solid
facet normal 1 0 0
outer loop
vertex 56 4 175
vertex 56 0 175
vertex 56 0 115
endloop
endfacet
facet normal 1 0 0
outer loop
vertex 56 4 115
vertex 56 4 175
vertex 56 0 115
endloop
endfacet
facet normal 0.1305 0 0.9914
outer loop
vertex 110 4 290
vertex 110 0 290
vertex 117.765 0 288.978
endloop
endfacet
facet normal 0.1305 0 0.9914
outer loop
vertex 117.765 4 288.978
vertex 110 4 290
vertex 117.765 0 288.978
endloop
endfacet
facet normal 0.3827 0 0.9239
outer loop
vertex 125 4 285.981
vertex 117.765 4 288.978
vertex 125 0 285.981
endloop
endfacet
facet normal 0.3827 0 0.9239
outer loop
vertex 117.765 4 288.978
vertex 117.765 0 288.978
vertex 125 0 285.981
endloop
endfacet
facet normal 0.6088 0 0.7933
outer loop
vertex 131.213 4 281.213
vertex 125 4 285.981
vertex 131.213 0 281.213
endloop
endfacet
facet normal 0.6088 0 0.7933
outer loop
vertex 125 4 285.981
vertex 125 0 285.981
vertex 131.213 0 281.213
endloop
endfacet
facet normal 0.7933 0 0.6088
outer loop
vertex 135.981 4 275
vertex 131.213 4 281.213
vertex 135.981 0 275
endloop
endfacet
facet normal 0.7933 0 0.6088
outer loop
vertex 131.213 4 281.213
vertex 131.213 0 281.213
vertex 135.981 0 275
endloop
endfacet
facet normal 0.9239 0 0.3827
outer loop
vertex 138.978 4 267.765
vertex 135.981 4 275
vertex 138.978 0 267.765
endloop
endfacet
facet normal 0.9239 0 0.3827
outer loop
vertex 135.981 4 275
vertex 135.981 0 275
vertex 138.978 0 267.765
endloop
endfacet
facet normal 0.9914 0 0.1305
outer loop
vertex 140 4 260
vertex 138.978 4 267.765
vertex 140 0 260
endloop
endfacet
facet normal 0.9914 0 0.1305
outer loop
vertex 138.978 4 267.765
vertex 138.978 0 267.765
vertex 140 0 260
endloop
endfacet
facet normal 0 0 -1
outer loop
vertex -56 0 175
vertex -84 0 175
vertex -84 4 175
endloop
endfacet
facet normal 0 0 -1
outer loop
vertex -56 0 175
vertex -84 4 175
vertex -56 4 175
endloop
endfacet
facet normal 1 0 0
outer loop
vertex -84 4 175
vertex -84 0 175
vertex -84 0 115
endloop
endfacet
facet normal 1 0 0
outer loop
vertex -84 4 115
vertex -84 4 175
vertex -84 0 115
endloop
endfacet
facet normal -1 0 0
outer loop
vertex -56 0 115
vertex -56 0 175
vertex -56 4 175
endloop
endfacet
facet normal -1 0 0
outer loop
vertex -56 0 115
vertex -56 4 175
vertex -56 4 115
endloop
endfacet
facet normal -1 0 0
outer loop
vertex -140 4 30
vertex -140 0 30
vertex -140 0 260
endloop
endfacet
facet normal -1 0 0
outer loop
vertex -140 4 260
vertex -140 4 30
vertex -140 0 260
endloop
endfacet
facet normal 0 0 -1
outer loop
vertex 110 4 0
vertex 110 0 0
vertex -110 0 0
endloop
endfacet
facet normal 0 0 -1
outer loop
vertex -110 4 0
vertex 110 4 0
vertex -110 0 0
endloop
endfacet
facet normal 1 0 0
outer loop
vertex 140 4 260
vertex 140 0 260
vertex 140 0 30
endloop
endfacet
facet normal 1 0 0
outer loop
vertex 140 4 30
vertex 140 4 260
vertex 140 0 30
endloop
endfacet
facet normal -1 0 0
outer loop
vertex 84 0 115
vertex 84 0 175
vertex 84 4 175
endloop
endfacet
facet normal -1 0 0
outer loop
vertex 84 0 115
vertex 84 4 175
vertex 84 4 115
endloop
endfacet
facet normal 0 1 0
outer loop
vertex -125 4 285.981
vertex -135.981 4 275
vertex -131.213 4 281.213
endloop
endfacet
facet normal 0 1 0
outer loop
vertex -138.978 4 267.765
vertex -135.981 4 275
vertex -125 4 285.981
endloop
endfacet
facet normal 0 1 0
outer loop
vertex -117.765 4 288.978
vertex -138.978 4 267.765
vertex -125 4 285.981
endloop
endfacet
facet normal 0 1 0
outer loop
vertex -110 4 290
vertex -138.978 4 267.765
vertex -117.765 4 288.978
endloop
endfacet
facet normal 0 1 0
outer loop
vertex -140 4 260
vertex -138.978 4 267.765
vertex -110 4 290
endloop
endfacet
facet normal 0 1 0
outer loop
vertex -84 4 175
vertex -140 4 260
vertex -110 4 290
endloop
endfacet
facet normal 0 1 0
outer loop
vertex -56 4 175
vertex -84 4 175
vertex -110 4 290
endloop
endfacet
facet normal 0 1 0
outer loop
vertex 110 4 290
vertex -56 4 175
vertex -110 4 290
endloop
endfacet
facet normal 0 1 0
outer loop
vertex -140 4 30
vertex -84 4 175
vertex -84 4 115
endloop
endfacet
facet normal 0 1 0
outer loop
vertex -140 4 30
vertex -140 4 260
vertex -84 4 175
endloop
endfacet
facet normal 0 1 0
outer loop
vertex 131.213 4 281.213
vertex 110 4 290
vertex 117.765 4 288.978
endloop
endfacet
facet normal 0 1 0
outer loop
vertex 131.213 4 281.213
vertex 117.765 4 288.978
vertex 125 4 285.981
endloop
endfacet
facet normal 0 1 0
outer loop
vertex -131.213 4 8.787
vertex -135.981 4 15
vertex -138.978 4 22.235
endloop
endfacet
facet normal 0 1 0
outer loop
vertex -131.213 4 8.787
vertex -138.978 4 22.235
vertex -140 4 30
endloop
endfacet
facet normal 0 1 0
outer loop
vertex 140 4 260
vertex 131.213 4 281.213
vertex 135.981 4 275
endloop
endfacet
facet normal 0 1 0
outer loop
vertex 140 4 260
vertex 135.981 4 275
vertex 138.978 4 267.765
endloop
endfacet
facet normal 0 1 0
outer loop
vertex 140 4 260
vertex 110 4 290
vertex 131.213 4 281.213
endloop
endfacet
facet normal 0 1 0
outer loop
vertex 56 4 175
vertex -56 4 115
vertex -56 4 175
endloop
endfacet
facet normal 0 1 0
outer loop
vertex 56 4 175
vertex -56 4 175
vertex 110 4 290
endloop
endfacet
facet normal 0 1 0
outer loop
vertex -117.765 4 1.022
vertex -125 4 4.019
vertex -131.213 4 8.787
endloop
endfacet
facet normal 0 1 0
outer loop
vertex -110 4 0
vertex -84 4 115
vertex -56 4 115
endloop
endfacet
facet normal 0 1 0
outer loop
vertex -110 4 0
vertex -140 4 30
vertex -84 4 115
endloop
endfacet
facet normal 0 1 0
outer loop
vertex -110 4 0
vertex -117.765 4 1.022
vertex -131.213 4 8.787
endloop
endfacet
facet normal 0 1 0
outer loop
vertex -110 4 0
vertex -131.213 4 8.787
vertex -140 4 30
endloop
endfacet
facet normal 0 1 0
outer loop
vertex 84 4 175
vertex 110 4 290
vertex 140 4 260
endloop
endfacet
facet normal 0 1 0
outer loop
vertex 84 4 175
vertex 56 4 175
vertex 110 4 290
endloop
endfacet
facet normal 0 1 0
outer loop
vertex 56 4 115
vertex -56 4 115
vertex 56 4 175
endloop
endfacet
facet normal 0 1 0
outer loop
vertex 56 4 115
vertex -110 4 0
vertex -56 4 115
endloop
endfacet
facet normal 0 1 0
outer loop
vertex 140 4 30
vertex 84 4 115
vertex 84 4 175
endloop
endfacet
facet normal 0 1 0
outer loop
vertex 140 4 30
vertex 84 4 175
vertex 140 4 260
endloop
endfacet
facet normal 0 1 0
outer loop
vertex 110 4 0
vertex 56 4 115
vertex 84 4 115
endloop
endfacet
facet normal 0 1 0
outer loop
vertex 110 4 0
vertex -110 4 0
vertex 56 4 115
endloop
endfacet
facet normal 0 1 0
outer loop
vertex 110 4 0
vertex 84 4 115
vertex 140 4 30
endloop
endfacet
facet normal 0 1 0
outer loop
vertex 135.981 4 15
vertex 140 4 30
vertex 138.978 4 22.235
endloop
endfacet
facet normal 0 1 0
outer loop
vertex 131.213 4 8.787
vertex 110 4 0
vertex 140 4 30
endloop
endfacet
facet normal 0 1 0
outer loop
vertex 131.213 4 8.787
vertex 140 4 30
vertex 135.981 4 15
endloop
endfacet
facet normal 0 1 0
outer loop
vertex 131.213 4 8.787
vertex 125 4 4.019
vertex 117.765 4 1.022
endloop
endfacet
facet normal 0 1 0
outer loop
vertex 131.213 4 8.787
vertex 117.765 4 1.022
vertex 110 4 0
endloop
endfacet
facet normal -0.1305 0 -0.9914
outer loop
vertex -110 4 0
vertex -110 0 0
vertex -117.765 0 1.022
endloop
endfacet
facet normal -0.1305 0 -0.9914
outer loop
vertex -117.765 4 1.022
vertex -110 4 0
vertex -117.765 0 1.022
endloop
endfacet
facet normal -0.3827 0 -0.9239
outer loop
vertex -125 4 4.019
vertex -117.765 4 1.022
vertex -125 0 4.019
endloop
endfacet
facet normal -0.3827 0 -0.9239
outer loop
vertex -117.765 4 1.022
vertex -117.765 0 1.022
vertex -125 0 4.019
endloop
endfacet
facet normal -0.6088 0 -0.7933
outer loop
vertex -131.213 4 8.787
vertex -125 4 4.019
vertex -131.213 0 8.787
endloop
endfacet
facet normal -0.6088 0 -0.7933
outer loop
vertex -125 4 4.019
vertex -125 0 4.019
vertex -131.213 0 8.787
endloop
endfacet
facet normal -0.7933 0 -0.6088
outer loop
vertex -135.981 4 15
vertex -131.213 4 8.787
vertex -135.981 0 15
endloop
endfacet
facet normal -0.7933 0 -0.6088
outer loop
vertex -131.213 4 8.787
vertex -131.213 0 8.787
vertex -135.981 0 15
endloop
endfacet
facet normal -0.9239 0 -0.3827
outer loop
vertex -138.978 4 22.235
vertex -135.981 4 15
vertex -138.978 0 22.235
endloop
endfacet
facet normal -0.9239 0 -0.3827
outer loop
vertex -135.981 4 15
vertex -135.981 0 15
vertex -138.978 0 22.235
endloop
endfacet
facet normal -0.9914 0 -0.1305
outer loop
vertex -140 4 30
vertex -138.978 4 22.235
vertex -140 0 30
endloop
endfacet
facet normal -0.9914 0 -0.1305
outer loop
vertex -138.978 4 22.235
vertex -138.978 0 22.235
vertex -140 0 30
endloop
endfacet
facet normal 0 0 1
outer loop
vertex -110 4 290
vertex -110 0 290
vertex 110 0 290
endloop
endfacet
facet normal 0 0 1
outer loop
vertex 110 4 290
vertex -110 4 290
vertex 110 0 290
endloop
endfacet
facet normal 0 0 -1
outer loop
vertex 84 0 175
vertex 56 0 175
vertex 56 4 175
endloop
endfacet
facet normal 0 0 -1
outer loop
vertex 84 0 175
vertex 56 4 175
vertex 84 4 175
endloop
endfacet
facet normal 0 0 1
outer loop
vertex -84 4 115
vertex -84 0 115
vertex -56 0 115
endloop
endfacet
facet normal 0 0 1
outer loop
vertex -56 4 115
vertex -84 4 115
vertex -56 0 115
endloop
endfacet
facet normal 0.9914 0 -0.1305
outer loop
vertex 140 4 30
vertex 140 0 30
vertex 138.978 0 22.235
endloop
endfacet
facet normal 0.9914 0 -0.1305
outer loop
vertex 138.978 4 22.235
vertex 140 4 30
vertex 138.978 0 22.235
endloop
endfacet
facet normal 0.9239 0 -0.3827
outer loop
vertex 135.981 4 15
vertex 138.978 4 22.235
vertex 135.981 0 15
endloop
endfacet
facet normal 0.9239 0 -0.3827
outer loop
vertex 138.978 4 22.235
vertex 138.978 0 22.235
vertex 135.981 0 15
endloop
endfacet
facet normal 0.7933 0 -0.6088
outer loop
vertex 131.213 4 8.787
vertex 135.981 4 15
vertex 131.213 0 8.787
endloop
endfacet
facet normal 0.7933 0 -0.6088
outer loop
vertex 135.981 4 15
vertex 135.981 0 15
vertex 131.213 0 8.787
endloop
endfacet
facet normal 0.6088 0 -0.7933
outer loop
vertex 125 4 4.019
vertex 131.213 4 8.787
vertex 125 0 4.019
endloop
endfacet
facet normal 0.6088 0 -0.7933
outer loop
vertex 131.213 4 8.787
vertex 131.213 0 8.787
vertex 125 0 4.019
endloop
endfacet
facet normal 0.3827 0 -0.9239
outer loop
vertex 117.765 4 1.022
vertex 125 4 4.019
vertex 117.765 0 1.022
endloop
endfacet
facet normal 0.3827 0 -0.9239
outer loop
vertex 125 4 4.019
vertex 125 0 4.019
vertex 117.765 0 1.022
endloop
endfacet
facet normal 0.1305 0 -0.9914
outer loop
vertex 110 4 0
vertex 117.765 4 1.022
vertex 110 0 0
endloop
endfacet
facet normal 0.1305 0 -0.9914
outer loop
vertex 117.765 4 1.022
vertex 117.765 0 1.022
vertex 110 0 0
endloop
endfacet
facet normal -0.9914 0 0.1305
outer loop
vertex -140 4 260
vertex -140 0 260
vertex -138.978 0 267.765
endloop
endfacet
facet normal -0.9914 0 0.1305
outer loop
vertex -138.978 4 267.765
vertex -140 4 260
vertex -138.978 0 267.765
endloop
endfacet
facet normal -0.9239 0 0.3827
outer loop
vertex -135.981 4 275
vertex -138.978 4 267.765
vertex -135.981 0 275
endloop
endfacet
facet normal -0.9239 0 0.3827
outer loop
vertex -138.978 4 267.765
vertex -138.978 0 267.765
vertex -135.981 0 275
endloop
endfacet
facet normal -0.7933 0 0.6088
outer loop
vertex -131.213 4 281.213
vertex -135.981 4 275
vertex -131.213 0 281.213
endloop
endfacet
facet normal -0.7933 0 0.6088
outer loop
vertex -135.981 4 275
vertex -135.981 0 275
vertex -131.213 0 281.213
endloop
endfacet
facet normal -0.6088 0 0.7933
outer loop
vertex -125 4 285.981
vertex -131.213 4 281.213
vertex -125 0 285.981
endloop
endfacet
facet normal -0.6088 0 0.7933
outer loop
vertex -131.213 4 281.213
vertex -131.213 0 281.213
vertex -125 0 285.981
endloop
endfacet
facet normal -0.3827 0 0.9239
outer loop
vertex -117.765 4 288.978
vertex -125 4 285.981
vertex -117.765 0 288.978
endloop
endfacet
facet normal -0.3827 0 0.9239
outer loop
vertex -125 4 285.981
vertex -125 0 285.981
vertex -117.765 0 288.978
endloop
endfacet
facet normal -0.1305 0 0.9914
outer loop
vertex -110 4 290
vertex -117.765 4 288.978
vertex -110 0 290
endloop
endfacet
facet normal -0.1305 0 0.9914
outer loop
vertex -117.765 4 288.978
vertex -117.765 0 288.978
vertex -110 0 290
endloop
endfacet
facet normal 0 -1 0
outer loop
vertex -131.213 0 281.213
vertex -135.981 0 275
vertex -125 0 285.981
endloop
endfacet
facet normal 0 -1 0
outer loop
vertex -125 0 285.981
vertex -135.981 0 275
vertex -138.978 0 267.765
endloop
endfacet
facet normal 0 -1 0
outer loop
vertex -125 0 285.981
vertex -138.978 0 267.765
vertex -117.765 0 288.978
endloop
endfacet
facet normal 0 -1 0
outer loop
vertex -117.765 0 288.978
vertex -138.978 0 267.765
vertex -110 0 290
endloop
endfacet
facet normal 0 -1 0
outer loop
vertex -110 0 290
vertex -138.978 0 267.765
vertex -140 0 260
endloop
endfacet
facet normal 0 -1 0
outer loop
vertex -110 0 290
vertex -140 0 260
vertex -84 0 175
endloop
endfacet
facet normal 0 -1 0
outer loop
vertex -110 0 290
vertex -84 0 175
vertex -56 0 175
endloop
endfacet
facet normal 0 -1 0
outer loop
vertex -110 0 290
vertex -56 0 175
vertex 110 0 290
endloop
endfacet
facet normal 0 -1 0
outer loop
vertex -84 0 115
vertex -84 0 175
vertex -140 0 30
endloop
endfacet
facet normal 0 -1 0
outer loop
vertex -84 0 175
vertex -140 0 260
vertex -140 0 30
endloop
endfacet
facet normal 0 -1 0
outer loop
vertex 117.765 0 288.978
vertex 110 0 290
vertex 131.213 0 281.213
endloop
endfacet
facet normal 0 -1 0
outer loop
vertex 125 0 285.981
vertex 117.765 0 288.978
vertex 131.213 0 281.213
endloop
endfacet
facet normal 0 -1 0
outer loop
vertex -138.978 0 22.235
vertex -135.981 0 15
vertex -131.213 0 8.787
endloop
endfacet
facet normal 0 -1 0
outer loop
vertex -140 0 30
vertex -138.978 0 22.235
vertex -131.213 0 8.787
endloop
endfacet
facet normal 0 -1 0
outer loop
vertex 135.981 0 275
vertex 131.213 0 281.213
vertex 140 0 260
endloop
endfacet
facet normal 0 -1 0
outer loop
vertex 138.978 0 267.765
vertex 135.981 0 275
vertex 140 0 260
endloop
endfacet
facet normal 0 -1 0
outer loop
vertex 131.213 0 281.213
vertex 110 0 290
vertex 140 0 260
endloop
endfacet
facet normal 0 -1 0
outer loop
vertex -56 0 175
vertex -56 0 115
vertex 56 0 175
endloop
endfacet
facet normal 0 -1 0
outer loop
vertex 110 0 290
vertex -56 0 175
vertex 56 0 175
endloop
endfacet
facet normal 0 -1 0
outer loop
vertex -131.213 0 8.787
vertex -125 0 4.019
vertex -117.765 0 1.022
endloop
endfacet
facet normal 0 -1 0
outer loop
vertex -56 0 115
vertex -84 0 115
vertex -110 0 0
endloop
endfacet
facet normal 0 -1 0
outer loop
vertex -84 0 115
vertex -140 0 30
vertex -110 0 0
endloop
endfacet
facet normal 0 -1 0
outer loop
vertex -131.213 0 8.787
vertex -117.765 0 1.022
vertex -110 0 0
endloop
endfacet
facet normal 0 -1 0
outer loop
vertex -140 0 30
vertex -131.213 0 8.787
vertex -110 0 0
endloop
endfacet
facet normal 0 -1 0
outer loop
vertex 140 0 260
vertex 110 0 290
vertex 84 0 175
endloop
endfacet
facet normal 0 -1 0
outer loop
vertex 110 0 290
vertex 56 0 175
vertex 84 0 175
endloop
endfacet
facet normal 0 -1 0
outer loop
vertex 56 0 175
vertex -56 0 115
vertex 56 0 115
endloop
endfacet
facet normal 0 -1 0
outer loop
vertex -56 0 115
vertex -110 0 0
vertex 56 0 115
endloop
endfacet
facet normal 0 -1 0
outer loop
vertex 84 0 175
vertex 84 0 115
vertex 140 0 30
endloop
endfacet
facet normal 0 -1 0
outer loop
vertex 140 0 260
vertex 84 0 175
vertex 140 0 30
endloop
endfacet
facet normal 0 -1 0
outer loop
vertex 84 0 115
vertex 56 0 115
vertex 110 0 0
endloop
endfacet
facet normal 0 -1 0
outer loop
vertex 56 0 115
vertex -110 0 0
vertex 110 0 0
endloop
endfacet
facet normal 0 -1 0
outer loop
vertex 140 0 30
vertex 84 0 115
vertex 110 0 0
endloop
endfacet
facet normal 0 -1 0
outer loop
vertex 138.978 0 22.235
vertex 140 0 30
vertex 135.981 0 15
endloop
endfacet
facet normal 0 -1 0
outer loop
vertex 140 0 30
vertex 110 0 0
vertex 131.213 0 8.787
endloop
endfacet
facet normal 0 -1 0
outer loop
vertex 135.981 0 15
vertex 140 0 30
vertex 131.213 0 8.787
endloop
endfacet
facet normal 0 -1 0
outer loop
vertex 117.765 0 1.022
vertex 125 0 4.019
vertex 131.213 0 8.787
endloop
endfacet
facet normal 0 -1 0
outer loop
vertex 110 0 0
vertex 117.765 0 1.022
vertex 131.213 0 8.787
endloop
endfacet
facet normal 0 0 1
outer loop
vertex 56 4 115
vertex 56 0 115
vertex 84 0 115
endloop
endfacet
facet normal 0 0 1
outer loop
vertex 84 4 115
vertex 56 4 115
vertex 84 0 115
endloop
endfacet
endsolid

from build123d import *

# Parameters (mm, degrees)
ESQUISSE1_W      = 28
ESQUISSE1_H      = 60
EXTRUSION1_DEPTH = 4


with BuildPart() as part:
    # Esquisse1 → Extrusion1 (new body)
    with BuildSketch(Plane(origin=(0, 0, 0), x_dir=(1, 0, 0), z_dir=(0, 1, 0))):
        with BuildLine():
            Line((110, 0), (-110, 0))
            ThreePointArc((-110, 0), (-131.213203436, -8.786796564), (-140, -30))
            Line((-140, -30), (-140, -260))
            ThreePointArc((-140, -260), (-131.213203436, -281.213203436), (-110, -290))
            Line((-110, -290), (110, -290))
            ThreePointArc((110, -290), (131.213203436, -281.213203436), (140, -260))
            Line((140, -260), (140, -30))
            ThreePointArc((140, -30), (131.213203436, -8.786796564), (110, 0))
        make_face()
        with Locations((70, -145)):
            Rectangle(ESQUISSE1_W, ESQUISSE1_H, mode=Mode.SUBTRACT)
        with Locations((-70, -145)):
            Rectangle(ESQUISSE1_W, ESQUISSE1_H, mode=Mode.SUBTRACT)
    extrude(amount=EXTRUSION1_DEPTH)


solid = part.part
